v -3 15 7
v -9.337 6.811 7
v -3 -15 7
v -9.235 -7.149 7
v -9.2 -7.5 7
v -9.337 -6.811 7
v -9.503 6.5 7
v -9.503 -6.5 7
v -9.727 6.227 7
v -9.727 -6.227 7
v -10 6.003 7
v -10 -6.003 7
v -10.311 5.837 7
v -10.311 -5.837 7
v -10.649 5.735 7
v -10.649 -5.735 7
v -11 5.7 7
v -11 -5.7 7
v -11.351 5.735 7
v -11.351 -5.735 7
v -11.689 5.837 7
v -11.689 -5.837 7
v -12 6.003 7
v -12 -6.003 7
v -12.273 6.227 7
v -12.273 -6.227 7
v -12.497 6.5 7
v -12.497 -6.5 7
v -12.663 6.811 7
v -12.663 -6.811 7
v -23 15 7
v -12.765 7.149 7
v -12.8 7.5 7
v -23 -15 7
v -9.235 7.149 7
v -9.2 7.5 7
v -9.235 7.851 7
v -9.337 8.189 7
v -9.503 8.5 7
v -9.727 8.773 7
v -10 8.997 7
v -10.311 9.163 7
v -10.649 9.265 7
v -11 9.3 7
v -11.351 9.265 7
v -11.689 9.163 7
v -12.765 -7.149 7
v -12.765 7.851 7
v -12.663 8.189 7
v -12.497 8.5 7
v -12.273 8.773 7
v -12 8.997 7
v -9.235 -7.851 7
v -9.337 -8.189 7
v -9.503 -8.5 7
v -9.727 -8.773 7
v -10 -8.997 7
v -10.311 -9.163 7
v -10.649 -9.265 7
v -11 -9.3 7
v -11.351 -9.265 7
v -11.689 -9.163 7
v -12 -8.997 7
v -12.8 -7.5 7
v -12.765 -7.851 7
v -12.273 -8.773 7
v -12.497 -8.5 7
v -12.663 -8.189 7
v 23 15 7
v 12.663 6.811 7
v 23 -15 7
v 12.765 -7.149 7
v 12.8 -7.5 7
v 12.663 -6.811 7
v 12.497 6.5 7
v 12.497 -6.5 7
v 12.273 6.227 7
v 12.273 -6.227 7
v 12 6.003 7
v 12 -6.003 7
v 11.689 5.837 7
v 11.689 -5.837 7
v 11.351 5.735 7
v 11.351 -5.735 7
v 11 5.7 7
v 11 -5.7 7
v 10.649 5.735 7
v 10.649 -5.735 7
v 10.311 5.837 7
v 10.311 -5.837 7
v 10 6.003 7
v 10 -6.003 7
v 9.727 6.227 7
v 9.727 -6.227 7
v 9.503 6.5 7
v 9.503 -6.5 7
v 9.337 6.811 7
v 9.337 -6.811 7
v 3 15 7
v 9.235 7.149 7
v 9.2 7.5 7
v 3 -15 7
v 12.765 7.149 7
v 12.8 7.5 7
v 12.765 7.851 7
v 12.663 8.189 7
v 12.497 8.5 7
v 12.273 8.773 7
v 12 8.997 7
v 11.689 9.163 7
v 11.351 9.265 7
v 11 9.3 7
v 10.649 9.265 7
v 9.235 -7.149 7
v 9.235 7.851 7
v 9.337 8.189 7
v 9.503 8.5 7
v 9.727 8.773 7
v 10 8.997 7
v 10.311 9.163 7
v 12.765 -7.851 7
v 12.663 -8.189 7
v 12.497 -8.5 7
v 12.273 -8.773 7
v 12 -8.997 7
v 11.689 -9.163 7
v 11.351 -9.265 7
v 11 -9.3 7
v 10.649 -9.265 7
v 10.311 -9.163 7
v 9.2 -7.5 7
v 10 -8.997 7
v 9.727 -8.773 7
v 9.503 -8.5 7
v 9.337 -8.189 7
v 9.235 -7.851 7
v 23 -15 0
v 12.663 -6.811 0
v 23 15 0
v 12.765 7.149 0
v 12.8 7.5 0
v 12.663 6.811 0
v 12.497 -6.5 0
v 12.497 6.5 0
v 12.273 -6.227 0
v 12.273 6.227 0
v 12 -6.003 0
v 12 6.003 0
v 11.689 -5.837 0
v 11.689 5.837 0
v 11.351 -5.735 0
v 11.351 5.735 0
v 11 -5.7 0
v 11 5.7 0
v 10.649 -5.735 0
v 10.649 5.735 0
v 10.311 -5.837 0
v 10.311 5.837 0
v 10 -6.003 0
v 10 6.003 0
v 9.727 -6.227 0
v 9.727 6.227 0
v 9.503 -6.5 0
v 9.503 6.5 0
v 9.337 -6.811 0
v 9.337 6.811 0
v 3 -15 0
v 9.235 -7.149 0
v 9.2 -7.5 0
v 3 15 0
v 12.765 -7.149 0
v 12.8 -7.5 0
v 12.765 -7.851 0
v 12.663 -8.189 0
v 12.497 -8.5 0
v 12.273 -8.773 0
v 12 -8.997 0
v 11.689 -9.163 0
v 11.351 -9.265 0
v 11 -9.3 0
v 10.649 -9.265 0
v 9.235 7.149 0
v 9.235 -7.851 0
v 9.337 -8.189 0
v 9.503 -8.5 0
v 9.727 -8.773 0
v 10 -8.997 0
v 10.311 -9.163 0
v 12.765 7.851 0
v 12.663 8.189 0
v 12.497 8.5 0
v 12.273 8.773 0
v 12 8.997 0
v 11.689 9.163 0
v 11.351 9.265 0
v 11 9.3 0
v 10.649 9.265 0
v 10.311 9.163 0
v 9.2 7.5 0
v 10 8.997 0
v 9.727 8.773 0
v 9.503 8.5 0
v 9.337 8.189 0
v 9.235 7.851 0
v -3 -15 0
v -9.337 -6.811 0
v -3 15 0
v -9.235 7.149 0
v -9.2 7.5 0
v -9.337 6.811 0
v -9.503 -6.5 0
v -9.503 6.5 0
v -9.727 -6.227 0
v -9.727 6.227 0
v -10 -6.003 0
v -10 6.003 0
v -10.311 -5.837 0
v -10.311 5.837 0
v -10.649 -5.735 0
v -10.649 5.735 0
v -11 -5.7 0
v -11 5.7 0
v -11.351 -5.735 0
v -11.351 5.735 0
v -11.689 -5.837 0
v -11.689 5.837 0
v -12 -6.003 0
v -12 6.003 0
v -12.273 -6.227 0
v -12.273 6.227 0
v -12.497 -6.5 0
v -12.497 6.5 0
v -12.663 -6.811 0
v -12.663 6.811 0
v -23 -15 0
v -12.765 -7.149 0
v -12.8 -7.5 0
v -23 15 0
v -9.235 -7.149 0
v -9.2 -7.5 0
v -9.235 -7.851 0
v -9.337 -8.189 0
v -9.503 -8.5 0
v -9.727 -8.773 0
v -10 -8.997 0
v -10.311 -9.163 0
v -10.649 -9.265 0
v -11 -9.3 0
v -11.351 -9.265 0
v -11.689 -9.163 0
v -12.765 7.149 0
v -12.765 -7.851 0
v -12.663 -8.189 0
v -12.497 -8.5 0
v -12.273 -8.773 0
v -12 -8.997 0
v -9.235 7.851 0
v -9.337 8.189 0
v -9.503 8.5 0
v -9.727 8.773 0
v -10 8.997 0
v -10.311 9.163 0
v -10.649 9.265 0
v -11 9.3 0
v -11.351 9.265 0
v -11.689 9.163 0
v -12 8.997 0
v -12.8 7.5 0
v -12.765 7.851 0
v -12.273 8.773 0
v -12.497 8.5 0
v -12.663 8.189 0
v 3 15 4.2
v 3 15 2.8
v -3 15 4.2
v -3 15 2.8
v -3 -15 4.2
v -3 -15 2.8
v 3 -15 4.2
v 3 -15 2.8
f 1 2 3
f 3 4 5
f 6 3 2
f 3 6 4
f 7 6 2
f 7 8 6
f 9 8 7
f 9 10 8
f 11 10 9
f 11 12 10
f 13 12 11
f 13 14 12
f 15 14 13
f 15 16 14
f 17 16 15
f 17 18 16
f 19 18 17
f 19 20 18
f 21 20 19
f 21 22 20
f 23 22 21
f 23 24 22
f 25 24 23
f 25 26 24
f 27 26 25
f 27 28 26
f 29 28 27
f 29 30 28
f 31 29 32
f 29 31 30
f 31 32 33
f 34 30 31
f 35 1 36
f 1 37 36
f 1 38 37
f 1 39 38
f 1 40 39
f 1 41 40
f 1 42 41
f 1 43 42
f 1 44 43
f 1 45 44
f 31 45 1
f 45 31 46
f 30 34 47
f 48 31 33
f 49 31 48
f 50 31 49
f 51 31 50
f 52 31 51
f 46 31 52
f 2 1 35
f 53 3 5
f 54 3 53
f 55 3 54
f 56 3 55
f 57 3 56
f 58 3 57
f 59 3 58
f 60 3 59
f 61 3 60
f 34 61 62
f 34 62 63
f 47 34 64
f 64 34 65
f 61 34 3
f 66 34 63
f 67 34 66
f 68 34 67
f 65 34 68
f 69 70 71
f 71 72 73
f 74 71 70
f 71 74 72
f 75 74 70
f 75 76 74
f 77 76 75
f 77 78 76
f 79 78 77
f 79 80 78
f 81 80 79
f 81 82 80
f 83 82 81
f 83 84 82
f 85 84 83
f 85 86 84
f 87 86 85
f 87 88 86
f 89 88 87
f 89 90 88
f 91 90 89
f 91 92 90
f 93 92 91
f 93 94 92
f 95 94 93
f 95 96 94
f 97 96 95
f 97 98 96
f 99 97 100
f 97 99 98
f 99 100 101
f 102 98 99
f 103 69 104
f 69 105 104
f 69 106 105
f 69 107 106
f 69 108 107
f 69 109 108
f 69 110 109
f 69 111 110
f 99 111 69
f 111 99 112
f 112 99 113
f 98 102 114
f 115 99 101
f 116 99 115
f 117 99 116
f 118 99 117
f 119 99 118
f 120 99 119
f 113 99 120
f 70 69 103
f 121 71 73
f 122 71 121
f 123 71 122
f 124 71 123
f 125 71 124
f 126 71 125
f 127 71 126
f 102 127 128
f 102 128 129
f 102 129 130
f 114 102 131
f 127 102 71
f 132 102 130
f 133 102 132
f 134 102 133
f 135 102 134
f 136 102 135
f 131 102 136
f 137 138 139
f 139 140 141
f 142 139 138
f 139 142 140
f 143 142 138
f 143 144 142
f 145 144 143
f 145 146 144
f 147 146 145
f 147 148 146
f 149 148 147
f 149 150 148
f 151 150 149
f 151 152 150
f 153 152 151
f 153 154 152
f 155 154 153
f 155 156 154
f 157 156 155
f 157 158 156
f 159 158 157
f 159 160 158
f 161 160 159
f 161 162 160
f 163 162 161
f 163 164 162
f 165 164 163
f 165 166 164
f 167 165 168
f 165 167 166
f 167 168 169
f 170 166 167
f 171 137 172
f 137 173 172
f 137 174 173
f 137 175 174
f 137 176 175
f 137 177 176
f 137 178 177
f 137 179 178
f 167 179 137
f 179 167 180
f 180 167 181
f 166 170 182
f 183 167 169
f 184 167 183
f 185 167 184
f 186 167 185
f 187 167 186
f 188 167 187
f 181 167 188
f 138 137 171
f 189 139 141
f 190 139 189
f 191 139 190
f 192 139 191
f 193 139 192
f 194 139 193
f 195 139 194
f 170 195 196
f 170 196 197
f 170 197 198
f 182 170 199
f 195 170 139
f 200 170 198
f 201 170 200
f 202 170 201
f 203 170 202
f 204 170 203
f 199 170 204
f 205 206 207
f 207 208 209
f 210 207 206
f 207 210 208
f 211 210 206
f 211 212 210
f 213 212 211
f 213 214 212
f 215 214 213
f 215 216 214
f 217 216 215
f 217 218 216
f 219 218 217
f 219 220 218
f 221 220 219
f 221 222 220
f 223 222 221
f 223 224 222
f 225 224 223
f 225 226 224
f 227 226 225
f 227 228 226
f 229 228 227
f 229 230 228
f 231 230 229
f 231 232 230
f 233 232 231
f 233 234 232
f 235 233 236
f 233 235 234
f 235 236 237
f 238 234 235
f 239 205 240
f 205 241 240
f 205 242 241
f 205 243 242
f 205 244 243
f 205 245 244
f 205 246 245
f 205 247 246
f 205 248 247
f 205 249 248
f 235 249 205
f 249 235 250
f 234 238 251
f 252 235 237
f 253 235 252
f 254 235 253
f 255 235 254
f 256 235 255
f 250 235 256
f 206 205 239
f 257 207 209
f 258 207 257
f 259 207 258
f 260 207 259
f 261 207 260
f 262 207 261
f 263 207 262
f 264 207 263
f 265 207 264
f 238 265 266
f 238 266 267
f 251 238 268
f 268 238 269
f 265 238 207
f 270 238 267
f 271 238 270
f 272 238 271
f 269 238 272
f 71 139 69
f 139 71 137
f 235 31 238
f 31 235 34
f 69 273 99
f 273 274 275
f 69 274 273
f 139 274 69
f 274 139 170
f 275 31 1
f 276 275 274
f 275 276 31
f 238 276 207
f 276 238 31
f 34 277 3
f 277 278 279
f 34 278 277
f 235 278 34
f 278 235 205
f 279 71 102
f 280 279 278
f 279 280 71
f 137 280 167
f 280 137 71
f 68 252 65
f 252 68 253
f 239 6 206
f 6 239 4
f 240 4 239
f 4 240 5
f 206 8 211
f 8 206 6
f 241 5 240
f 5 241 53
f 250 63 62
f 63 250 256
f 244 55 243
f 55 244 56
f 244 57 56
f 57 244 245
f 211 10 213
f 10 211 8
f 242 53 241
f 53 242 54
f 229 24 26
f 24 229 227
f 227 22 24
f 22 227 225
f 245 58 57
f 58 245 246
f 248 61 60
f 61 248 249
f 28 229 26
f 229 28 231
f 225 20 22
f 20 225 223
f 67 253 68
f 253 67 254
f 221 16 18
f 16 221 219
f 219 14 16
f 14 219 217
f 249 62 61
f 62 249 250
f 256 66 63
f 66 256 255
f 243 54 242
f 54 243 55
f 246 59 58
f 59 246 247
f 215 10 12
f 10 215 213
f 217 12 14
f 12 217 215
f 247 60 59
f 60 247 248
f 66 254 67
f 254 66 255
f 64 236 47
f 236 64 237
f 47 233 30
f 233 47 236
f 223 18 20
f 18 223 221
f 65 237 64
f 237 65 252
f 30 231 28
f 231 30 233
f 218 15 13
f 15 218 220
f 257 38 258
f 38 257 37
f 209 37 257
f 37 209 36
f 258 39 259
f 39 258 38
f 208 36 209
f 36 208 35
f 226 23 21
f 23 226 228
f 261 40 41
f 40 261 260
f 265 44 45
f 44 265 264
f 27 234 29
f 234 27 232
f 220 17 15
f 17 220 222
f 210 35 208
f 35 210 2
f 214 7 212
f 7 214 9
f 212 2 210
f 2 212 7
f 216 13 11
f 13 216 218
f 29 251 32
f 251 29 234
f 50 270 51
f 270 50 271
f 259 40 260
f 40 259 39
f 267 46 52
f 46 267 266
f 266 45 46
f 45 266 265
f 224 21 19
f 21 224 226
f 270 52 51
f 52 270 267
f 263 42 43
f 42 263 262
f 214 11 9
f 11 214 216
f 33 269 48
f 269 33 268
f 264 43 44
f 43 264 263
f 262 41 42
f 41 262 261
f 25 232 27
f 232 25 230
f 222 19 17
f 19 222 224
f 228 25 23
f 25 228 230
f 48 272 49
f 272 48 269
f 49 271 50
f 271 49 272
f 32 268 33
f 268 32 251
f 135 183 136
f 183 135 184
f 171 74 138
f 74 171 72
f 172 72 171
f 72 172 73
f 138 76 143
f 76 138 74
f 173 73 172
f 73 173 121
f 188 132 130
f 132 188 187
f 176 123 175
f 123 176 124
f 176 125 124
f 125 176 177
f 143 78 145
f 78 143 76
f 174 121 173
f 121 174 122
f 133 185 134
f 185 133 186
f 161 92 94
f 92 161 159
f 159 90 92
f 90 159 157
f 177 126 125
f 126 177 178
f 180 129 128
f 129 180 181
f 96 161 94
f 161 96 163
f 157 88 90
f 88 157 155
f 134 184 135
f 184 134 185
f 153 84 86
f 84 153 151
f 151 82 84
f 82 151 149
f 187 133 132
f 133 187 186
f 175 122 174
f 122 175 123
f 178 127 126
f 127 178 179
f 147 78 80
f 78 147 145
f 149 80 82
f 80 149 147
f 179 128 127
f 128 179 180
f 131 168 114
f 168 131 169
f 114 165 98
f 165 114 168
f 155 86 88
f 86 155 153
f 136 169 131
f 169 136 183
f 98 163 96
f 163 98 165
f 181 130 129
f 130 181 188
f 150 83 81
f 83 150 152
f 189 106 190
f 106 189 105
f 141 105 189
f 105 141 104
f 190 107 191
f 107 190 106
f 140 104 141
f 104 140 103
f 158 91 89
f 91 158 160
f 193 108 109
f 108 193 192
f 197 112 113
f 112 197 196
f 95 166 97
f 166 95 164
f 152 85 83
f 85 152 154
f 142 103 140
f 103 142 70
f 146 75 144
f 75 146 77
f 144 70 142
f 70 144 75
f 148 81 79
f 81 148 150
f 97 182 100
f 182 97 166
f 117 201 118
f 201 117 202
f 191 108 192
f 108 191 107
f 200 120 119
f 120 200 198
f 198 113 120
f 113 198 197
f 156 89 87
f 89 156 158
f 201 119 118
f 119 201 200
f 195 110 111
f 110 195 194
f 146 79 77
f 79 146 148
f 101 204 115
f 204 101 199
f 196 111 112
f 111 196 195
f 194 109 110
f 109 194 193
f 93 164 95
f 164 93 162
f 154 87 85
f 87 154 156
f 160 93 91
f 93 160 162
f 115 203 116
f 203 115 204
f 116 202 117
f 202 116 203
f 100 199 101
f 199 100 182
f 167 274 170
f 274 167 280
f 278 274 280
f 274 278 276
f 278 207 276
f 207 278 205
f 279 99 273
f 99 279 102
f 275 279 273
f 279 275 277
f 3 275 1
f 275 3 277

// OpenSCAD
$fn = 32;

// ----------------------------------------------------------------------
// Living hinge: 46 x 30 mm plates, 1.4 mm flexible web
// ----------------------------------------------------------------------

// --- parameters (mm) ---
plate_len = 20;           // plate length outside the web
plate_w = 30;             // plate width
thick = 7;                // plate thickness
web_half = 3;             // half width of the flex band
web_t = 1.4;              // flexible web thickness
web_z = 2.8;              // web position inside the thickness
boss_d = 11;              // screw boss diameter
boss_h = 7;               // screw boss height
boss_x = 11;              // screw boss distance from the web
screw_d = 3.6;            // screw hole

difference() {
  union() {
    /* one flat strip, later thinned at the middle */
    translate([-23, -15, 0]) cube([46, 30, 7]);
    /* screw bosses, sunk 0.5 mm into the plates */
    for (sx = [-11, 11]) {
      for (sy = [-7.5, 7.5]) {
        translate([sx, sy, 0]) cylinder(h = boss_h, d = boss_d);
      }
    }
  }
  /* channel from below: leaves the web on top of it */
  translate([-3, -17.5, -2.5]) cube([6, 35, 5.3]);
  /* channel from above: thins the web down to web_t */
  translate([-3, -17.5, 4.2]) cube([6, 35, 5.3]);
  /* screw holes through the bosses */
  for (sx = [-11, 11]) {
    for (sy = [-7.5, 7.5]) {
      translate([sx, sy, -2.5]) cylinder(h = boss_h + 5, d = screw_d);
    }
  }
}
